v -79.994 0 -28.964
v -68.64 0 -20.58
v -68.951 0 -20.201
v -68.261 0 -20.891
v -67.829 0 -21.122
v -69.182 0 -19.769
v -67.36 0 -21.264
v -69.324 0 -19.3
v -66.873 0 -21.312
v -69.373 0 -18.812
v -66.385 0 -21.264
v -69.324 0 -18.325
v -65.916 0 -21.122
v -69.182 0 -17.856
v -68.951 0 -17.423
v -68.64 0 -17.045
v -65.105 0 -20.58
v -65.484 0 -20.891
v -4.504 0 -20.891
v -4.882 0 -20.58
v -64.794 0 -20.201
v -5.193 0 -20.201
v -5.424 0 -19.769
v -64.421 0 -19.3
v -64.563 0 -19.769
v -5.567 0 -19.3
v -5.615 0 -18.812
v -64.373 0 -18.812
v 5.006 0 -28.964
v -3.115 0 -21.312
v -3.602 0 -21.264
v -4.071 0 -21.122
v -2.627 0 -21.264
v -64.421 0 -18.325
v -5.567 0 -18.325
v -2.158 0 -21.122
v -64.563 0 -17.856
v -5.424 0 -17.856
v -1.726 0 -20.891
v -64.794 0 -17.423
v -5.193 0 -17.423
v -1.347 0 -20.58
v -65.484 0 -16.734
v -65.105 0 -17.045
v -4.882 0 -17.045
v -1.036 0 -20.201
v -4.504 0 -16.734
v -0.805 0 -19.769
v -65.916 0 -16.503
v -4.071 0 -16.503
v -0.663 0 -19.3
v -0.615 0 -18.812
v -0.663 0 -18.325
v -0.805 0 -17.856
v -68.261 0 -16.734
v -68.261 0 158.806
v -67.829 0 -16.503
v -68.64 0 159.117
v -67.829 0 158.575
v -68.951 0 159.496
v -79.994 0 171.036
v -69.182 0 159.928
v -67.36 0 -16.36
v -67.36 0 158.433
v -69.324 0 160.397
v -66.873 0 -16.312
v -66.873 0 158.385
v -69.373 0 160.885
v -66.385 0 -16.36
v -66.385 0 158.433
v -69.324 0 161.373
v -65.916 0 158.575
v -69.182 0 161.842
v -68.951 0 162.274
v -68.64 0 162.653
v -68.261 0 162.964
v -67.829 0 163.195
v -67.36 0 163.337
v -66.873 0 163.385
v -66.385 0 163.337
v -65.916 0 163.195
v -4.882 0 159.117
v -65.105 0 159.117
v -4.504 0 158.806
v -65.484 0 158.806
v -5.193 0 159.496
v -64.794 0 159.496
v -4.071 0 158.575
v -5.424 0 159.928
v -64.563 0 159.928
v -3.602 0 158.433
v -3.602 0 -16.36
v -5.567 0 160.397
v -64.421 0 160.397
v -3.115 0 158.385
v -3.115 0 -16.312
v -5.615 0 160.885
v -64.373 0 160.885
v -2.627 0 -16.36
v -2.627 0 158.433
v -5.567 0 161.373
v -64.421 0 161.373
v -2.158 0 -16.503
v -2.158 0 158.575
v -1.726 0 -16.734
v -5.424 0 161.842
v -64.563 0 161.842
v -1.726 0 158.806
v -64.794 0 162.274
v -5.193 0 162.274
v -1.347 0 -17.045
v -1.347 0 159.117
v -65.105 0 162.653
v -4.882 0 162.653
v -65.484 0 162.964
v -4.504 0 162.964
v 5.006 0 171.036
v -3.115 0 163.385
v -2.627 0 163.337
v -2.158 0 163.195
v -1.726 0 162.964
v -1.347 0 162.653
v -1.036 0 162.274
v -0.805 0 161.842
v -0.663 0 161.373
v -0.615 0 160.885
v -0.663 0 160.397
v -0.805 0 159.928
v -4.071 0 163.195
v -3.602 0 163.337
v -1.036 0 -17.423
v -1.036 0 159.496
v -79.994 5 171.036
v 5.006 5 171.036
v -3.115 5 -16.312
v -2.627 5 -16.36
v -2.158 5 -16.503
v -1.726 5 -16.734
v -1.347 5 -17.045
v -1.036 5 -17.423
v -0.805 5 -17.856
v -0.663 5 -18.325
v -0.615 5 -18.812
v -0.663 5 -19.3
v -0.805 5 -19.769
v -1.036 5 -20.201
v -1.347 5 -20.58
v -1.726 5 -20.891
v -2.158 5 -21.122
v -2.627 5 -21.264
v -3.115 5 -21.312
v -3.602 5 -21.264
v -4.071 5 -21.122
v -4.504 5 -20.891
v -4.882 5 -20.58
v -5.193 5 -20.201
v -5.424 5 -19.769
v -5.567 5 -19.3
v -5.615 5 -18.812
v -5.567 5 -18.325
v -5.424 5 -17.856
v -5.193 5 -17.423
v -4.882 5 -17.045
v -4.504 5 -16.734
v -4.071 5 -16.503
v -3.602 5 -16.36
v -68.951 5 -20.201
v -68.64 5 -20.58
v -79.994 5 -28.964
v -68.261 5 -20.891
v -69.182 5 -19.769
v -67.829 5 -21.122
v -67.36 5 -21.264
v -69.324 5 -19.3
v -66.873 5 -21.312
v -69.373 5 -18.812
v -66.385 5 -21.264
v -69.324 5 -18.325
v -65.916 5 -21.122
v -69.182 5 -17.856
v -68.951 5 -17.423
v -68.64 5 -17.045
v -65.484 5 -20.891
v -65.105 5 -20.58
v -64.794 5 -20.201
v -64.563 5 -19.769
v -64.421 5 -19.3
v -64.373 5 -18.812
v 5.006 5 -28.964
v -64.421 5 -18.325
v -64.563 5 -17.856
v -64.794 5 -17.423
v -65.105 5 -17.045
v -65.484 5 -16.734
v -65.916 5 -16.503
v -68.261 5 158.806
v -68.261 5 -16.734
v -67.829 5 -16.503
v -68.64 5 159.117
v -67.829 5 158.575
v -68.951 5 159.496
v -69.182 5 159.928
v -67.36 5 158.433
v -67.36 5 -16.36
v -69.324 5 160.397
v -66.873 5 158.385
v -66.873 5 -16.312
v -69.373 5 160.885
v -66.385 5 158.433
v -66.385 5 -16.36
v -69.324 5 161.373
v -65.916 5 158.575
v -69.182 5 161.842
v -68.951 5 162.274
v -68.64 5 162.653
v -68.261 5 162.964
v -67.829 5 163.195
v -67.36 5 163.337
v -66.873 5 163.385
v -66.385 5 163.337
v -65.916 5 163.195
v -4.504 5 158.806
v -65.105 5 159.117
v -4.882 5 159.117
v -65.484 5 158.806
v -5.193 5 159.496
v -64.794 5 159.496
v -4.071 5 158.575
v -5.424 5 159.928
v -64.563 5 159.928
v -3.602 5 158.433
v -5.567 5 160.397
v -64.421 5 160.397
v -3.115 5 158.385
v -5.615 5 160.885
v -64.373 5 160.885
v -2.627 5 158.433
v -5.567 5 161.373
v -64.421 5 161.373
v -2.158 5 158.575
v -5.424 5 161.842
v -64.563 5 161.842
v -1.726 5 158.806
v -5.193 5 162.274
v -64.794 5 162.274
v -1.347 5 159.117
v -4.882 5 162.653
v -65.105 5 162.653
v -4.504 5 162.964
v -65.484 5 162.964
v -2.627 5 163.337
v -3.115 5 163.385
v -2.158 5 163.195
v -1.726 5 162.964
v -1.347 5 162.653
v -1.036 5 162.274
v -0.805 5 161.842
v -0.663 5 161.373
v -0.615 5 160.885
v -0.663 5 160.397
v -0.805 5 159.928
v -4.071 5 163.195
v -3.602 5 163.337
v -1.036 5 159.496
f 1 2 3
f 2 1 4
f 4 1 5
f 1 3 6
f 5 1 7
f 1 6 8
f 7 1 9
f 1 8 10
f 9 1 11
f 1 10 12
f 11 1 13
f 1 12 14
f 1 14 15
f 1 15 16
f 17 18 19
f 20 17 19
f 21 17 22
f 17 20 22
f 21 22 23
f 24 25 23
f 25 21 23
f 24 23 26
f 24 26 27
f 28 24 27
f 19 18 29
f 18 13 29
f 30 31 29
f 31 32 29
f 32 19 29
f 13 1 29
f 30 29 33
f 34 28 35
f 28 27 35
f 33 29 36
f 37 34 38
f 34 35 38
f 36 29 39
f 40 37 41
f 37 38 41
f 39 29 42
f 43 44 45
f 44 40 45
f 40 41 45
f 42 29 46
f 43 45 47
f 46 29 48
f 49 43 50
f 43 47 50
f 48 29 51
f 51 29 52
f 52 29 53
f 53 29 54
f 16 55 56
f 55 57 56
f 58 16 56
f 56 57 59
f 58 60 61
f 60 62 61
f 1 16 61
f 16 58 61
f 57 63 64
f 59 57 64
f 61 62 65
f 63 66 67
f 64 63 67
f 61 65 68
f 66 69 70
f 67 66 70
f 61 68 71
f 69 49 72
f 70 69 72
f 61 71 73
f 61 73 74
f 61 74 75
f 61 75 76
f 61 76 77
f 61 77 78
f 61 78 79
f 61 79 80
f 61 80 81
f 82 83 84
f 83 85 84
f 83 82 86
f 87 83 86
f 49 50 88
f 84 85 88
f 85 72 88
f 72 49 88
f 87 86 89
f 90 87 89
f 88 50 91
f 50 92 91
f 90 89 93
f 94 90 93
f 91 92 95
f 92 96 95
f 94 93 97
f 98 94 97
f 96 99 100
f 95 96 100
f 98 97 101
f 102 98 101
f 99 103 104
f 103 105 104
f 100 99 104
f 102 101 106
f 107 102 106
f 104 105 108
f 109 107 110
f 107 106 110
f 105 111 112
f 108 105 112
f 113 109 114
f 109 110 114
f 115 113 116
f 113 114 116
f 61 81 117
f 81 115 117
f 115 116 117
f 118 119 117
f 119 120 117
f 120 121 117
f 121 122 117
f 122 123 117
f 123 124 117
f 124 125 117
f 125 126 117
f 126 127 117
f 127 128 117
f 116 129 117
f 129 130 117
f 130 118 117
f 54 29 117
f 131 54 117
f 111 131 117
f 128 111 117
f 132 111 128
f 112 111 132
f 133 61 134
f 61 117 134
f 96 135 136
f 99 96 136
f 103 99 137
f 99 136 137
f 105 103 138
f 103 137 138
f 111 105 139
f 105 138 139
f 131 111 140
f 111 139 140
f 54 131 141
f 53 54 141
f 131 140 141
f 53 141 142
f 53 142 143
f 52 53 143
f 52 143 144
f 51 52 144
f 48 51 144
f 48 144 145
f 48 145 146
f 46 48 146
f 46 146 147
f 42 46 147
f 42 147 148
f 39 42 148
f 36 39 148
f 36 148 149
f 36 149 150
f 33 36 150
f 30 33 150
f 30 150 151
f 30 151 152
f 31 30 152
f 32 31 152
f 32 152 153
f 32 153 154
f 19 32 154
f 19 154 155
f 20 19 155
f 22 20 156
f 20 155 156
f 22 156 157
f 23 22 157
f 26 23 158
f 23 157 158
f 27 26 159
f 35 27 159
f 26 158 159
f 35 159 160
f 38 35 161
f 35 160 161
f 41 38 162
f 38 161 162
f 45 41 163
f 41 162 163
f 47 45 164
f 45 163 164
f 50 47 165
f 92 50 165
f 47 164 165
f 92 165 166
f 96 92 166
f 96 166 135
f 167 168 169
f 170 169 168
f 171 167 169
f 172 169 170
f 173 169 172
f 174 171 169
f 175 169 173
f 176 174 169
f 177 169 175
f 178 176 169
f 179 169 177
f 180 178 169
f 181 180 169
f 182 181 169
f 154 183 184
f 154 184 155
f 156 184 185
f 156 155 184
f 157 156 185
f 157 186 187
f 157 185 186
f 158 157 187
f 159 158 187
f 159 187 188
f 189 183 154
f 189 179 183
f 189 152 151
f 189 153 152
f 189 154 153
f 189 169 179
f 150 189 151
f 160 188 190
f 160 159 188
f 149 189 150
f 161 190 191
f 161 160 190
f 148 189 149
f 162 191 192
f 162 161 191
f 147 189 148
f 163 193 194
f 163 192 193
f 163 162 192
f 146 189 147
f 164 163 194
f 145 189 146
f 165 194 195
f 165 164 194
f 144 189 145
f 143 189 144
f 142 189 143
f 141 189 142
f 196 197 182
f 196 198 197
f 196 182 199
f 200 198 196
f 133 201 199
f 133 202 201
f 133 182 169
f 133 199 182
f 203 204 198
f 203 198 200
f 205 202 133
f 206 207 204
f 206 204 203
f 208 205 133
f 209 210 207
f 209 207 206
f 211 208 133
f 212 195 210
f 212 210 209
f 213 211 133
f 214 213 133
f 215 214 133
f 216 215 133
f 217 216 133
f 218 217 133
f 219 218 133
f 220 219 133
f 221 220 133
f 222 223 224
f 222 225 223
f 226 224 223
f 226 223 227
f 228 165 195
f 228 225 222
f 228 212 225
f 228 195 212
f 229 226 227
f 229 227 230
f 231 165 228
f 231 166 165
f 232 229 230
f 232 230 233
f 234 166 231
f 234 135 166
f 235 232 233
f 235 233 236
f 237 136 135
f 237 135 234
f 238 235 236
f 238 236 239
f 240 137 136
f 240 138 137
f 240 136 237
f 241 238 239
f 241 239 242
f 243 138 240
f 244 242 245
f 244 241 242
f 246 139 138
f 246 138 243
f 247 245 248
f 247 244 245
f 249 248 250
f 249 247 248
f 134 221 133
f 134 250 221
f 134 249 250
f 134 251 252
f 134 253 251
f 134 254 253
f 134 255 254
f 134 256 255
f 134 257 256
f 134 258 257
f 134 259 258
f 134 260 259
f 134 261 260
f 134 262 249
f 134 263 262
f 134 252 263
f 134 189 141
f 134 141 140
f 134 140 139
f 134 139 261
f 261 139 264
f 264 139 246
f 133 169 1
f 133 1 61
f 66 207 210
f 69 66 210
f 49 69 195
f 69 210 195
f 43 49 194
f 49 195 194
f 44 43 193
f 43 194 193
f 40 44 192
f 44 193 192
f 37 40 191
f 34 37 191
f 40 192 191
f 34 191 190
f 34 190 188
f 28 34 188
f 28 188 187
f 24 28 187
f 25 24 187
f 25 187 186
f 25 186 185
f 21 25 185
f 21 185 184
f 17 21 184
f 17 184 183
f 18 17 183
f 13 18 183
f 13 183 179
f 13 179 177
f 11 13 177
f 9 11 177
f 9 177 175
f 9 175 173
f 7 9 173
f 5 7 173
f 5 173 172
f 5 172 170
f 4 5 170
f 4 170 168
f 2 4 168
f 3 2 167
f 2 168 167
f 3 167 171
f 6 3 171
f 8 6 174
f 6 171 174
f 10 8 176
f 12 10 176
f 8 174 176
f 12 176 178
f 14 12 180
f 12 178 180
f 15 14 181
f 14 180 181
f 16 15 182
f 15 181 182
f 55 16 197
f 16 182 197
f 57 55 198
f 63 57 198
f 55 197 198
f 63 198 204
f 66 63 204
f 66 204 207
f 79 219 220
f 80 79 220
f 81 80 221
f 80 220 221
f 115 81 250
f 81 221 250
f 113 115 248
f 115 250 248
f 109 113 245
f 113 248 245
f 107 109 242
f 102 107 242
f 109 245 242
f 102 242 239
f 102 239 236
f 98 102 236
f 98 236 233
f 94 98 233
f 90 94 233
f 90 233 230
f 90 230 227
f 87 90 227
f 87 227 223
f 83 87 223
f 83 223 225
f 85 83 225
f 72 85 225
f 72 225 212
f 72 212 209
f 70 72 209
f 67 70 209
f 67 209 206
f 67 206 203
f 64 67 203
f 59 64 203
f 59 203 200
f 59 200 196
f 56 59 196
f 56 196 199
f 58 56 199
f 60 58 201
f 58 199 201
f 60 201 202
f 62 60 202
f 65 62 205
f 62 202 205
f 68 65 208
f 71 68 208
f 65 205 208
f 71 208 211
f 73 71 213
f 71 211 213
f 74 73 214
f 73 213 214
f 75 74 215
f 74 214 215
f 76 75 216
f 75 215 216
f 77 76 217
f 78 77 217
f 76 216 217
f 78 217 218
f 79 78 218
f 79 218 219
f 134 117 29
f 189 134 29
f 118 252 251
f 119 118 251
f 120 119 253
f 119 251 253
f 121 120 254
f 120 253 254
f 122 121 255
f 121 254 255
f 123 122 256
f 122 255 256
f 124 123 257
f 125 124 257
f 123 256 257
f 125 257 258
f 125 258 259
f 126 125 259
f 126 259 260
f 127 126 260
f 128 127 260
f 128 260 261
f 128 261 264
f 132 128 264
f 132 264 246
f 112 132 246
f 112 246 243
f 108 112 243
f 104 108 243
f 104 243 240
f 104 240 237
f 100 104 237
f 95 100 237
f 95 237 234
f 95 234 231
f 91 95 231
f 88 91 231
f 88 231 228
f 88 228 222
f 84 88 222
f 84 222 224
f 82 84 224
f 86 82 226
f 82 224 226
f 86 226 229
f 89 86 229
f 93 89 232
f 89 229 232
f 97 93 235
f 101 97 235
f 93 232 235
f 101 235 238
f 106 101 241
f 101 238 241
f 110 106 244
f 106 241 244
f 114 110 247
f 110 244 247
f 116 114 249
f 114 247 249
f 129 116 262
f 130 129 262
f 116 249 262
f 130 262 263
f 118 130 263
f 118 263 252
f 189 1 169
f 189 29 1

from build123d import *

# Parameters (mm, degrees)
STOCK_BASE_1_OUTLINE_W = 80
STOCK_BASE_1_OUTLINE_H = 200
STOCK_BASE_1_DEPTH     = 5
SKETCH1_R              = 2.5
CUT_EXTRUDE2_DEPTH     = 10
SKETCH3_W              = 200
SKETCH3_H              = 5
BOSS_EXTRUDE1_DEPTH    = 5


# Read off the part's stored shape, not the designer's step: Stock-Base-1
with BuildPart() as part:
    # Stock-Base-1 outline → Stock-Base-1 (new body)
    with BuildSketch(Plane(origin=(0, 0, 0), x_dir=(1, 0, 0), z_dir=(0, 1, 0))):
        with Locations((-34.993542676, -71.036319336)):
            Rectangle(STOCK_BASE_1_OUTLINE_W, STOCK_BASE_1_OUTLINE_H)
    extrude(amount=STOCK_BASE_1_DEPTH)

    # Sketch1 → Cut-Extrude2 (cut)
    with BuildSketch(Plane(origin=(0, 5, 0), x_dir=(1, 0, 0), z_dir=(0, 1, 0))):
        with Locations(Location((-66.872507057, 18.812386141, 0), (0, 0, 270))):
            Circle(SKETCH1_R)
        with Locations(Location((-3.114578294, 18.812386141, 0), (0, 0, 270))):
            Circle(SKETCH1_R)
        with Locations(Location((-3.114578294, -160.885024814, 0), (0, 0, 270))):
            Circle(SKETCH1_R)
        with Locations(Location((-66.872507057, -160.885024814, 0), (0, 0, 270))):
            Circle(SKETCH1_R)
    extrude(amount=-CUT_EXTRUDE2_DEPTH, mode=Mode.SUBTRACT)

    # Sketch3 → Boss-Extrude1 (add)
    with BuildSketch(Plane.ZY.offset(74.993542676)):
        with Locations((71.036319336, 2.5)):
            Rectangle(SKETCH3_W, SKETCH3_H)
    extrude(amount=BOSS_EXTRUDE1_DEPTH)


solid = part.part
